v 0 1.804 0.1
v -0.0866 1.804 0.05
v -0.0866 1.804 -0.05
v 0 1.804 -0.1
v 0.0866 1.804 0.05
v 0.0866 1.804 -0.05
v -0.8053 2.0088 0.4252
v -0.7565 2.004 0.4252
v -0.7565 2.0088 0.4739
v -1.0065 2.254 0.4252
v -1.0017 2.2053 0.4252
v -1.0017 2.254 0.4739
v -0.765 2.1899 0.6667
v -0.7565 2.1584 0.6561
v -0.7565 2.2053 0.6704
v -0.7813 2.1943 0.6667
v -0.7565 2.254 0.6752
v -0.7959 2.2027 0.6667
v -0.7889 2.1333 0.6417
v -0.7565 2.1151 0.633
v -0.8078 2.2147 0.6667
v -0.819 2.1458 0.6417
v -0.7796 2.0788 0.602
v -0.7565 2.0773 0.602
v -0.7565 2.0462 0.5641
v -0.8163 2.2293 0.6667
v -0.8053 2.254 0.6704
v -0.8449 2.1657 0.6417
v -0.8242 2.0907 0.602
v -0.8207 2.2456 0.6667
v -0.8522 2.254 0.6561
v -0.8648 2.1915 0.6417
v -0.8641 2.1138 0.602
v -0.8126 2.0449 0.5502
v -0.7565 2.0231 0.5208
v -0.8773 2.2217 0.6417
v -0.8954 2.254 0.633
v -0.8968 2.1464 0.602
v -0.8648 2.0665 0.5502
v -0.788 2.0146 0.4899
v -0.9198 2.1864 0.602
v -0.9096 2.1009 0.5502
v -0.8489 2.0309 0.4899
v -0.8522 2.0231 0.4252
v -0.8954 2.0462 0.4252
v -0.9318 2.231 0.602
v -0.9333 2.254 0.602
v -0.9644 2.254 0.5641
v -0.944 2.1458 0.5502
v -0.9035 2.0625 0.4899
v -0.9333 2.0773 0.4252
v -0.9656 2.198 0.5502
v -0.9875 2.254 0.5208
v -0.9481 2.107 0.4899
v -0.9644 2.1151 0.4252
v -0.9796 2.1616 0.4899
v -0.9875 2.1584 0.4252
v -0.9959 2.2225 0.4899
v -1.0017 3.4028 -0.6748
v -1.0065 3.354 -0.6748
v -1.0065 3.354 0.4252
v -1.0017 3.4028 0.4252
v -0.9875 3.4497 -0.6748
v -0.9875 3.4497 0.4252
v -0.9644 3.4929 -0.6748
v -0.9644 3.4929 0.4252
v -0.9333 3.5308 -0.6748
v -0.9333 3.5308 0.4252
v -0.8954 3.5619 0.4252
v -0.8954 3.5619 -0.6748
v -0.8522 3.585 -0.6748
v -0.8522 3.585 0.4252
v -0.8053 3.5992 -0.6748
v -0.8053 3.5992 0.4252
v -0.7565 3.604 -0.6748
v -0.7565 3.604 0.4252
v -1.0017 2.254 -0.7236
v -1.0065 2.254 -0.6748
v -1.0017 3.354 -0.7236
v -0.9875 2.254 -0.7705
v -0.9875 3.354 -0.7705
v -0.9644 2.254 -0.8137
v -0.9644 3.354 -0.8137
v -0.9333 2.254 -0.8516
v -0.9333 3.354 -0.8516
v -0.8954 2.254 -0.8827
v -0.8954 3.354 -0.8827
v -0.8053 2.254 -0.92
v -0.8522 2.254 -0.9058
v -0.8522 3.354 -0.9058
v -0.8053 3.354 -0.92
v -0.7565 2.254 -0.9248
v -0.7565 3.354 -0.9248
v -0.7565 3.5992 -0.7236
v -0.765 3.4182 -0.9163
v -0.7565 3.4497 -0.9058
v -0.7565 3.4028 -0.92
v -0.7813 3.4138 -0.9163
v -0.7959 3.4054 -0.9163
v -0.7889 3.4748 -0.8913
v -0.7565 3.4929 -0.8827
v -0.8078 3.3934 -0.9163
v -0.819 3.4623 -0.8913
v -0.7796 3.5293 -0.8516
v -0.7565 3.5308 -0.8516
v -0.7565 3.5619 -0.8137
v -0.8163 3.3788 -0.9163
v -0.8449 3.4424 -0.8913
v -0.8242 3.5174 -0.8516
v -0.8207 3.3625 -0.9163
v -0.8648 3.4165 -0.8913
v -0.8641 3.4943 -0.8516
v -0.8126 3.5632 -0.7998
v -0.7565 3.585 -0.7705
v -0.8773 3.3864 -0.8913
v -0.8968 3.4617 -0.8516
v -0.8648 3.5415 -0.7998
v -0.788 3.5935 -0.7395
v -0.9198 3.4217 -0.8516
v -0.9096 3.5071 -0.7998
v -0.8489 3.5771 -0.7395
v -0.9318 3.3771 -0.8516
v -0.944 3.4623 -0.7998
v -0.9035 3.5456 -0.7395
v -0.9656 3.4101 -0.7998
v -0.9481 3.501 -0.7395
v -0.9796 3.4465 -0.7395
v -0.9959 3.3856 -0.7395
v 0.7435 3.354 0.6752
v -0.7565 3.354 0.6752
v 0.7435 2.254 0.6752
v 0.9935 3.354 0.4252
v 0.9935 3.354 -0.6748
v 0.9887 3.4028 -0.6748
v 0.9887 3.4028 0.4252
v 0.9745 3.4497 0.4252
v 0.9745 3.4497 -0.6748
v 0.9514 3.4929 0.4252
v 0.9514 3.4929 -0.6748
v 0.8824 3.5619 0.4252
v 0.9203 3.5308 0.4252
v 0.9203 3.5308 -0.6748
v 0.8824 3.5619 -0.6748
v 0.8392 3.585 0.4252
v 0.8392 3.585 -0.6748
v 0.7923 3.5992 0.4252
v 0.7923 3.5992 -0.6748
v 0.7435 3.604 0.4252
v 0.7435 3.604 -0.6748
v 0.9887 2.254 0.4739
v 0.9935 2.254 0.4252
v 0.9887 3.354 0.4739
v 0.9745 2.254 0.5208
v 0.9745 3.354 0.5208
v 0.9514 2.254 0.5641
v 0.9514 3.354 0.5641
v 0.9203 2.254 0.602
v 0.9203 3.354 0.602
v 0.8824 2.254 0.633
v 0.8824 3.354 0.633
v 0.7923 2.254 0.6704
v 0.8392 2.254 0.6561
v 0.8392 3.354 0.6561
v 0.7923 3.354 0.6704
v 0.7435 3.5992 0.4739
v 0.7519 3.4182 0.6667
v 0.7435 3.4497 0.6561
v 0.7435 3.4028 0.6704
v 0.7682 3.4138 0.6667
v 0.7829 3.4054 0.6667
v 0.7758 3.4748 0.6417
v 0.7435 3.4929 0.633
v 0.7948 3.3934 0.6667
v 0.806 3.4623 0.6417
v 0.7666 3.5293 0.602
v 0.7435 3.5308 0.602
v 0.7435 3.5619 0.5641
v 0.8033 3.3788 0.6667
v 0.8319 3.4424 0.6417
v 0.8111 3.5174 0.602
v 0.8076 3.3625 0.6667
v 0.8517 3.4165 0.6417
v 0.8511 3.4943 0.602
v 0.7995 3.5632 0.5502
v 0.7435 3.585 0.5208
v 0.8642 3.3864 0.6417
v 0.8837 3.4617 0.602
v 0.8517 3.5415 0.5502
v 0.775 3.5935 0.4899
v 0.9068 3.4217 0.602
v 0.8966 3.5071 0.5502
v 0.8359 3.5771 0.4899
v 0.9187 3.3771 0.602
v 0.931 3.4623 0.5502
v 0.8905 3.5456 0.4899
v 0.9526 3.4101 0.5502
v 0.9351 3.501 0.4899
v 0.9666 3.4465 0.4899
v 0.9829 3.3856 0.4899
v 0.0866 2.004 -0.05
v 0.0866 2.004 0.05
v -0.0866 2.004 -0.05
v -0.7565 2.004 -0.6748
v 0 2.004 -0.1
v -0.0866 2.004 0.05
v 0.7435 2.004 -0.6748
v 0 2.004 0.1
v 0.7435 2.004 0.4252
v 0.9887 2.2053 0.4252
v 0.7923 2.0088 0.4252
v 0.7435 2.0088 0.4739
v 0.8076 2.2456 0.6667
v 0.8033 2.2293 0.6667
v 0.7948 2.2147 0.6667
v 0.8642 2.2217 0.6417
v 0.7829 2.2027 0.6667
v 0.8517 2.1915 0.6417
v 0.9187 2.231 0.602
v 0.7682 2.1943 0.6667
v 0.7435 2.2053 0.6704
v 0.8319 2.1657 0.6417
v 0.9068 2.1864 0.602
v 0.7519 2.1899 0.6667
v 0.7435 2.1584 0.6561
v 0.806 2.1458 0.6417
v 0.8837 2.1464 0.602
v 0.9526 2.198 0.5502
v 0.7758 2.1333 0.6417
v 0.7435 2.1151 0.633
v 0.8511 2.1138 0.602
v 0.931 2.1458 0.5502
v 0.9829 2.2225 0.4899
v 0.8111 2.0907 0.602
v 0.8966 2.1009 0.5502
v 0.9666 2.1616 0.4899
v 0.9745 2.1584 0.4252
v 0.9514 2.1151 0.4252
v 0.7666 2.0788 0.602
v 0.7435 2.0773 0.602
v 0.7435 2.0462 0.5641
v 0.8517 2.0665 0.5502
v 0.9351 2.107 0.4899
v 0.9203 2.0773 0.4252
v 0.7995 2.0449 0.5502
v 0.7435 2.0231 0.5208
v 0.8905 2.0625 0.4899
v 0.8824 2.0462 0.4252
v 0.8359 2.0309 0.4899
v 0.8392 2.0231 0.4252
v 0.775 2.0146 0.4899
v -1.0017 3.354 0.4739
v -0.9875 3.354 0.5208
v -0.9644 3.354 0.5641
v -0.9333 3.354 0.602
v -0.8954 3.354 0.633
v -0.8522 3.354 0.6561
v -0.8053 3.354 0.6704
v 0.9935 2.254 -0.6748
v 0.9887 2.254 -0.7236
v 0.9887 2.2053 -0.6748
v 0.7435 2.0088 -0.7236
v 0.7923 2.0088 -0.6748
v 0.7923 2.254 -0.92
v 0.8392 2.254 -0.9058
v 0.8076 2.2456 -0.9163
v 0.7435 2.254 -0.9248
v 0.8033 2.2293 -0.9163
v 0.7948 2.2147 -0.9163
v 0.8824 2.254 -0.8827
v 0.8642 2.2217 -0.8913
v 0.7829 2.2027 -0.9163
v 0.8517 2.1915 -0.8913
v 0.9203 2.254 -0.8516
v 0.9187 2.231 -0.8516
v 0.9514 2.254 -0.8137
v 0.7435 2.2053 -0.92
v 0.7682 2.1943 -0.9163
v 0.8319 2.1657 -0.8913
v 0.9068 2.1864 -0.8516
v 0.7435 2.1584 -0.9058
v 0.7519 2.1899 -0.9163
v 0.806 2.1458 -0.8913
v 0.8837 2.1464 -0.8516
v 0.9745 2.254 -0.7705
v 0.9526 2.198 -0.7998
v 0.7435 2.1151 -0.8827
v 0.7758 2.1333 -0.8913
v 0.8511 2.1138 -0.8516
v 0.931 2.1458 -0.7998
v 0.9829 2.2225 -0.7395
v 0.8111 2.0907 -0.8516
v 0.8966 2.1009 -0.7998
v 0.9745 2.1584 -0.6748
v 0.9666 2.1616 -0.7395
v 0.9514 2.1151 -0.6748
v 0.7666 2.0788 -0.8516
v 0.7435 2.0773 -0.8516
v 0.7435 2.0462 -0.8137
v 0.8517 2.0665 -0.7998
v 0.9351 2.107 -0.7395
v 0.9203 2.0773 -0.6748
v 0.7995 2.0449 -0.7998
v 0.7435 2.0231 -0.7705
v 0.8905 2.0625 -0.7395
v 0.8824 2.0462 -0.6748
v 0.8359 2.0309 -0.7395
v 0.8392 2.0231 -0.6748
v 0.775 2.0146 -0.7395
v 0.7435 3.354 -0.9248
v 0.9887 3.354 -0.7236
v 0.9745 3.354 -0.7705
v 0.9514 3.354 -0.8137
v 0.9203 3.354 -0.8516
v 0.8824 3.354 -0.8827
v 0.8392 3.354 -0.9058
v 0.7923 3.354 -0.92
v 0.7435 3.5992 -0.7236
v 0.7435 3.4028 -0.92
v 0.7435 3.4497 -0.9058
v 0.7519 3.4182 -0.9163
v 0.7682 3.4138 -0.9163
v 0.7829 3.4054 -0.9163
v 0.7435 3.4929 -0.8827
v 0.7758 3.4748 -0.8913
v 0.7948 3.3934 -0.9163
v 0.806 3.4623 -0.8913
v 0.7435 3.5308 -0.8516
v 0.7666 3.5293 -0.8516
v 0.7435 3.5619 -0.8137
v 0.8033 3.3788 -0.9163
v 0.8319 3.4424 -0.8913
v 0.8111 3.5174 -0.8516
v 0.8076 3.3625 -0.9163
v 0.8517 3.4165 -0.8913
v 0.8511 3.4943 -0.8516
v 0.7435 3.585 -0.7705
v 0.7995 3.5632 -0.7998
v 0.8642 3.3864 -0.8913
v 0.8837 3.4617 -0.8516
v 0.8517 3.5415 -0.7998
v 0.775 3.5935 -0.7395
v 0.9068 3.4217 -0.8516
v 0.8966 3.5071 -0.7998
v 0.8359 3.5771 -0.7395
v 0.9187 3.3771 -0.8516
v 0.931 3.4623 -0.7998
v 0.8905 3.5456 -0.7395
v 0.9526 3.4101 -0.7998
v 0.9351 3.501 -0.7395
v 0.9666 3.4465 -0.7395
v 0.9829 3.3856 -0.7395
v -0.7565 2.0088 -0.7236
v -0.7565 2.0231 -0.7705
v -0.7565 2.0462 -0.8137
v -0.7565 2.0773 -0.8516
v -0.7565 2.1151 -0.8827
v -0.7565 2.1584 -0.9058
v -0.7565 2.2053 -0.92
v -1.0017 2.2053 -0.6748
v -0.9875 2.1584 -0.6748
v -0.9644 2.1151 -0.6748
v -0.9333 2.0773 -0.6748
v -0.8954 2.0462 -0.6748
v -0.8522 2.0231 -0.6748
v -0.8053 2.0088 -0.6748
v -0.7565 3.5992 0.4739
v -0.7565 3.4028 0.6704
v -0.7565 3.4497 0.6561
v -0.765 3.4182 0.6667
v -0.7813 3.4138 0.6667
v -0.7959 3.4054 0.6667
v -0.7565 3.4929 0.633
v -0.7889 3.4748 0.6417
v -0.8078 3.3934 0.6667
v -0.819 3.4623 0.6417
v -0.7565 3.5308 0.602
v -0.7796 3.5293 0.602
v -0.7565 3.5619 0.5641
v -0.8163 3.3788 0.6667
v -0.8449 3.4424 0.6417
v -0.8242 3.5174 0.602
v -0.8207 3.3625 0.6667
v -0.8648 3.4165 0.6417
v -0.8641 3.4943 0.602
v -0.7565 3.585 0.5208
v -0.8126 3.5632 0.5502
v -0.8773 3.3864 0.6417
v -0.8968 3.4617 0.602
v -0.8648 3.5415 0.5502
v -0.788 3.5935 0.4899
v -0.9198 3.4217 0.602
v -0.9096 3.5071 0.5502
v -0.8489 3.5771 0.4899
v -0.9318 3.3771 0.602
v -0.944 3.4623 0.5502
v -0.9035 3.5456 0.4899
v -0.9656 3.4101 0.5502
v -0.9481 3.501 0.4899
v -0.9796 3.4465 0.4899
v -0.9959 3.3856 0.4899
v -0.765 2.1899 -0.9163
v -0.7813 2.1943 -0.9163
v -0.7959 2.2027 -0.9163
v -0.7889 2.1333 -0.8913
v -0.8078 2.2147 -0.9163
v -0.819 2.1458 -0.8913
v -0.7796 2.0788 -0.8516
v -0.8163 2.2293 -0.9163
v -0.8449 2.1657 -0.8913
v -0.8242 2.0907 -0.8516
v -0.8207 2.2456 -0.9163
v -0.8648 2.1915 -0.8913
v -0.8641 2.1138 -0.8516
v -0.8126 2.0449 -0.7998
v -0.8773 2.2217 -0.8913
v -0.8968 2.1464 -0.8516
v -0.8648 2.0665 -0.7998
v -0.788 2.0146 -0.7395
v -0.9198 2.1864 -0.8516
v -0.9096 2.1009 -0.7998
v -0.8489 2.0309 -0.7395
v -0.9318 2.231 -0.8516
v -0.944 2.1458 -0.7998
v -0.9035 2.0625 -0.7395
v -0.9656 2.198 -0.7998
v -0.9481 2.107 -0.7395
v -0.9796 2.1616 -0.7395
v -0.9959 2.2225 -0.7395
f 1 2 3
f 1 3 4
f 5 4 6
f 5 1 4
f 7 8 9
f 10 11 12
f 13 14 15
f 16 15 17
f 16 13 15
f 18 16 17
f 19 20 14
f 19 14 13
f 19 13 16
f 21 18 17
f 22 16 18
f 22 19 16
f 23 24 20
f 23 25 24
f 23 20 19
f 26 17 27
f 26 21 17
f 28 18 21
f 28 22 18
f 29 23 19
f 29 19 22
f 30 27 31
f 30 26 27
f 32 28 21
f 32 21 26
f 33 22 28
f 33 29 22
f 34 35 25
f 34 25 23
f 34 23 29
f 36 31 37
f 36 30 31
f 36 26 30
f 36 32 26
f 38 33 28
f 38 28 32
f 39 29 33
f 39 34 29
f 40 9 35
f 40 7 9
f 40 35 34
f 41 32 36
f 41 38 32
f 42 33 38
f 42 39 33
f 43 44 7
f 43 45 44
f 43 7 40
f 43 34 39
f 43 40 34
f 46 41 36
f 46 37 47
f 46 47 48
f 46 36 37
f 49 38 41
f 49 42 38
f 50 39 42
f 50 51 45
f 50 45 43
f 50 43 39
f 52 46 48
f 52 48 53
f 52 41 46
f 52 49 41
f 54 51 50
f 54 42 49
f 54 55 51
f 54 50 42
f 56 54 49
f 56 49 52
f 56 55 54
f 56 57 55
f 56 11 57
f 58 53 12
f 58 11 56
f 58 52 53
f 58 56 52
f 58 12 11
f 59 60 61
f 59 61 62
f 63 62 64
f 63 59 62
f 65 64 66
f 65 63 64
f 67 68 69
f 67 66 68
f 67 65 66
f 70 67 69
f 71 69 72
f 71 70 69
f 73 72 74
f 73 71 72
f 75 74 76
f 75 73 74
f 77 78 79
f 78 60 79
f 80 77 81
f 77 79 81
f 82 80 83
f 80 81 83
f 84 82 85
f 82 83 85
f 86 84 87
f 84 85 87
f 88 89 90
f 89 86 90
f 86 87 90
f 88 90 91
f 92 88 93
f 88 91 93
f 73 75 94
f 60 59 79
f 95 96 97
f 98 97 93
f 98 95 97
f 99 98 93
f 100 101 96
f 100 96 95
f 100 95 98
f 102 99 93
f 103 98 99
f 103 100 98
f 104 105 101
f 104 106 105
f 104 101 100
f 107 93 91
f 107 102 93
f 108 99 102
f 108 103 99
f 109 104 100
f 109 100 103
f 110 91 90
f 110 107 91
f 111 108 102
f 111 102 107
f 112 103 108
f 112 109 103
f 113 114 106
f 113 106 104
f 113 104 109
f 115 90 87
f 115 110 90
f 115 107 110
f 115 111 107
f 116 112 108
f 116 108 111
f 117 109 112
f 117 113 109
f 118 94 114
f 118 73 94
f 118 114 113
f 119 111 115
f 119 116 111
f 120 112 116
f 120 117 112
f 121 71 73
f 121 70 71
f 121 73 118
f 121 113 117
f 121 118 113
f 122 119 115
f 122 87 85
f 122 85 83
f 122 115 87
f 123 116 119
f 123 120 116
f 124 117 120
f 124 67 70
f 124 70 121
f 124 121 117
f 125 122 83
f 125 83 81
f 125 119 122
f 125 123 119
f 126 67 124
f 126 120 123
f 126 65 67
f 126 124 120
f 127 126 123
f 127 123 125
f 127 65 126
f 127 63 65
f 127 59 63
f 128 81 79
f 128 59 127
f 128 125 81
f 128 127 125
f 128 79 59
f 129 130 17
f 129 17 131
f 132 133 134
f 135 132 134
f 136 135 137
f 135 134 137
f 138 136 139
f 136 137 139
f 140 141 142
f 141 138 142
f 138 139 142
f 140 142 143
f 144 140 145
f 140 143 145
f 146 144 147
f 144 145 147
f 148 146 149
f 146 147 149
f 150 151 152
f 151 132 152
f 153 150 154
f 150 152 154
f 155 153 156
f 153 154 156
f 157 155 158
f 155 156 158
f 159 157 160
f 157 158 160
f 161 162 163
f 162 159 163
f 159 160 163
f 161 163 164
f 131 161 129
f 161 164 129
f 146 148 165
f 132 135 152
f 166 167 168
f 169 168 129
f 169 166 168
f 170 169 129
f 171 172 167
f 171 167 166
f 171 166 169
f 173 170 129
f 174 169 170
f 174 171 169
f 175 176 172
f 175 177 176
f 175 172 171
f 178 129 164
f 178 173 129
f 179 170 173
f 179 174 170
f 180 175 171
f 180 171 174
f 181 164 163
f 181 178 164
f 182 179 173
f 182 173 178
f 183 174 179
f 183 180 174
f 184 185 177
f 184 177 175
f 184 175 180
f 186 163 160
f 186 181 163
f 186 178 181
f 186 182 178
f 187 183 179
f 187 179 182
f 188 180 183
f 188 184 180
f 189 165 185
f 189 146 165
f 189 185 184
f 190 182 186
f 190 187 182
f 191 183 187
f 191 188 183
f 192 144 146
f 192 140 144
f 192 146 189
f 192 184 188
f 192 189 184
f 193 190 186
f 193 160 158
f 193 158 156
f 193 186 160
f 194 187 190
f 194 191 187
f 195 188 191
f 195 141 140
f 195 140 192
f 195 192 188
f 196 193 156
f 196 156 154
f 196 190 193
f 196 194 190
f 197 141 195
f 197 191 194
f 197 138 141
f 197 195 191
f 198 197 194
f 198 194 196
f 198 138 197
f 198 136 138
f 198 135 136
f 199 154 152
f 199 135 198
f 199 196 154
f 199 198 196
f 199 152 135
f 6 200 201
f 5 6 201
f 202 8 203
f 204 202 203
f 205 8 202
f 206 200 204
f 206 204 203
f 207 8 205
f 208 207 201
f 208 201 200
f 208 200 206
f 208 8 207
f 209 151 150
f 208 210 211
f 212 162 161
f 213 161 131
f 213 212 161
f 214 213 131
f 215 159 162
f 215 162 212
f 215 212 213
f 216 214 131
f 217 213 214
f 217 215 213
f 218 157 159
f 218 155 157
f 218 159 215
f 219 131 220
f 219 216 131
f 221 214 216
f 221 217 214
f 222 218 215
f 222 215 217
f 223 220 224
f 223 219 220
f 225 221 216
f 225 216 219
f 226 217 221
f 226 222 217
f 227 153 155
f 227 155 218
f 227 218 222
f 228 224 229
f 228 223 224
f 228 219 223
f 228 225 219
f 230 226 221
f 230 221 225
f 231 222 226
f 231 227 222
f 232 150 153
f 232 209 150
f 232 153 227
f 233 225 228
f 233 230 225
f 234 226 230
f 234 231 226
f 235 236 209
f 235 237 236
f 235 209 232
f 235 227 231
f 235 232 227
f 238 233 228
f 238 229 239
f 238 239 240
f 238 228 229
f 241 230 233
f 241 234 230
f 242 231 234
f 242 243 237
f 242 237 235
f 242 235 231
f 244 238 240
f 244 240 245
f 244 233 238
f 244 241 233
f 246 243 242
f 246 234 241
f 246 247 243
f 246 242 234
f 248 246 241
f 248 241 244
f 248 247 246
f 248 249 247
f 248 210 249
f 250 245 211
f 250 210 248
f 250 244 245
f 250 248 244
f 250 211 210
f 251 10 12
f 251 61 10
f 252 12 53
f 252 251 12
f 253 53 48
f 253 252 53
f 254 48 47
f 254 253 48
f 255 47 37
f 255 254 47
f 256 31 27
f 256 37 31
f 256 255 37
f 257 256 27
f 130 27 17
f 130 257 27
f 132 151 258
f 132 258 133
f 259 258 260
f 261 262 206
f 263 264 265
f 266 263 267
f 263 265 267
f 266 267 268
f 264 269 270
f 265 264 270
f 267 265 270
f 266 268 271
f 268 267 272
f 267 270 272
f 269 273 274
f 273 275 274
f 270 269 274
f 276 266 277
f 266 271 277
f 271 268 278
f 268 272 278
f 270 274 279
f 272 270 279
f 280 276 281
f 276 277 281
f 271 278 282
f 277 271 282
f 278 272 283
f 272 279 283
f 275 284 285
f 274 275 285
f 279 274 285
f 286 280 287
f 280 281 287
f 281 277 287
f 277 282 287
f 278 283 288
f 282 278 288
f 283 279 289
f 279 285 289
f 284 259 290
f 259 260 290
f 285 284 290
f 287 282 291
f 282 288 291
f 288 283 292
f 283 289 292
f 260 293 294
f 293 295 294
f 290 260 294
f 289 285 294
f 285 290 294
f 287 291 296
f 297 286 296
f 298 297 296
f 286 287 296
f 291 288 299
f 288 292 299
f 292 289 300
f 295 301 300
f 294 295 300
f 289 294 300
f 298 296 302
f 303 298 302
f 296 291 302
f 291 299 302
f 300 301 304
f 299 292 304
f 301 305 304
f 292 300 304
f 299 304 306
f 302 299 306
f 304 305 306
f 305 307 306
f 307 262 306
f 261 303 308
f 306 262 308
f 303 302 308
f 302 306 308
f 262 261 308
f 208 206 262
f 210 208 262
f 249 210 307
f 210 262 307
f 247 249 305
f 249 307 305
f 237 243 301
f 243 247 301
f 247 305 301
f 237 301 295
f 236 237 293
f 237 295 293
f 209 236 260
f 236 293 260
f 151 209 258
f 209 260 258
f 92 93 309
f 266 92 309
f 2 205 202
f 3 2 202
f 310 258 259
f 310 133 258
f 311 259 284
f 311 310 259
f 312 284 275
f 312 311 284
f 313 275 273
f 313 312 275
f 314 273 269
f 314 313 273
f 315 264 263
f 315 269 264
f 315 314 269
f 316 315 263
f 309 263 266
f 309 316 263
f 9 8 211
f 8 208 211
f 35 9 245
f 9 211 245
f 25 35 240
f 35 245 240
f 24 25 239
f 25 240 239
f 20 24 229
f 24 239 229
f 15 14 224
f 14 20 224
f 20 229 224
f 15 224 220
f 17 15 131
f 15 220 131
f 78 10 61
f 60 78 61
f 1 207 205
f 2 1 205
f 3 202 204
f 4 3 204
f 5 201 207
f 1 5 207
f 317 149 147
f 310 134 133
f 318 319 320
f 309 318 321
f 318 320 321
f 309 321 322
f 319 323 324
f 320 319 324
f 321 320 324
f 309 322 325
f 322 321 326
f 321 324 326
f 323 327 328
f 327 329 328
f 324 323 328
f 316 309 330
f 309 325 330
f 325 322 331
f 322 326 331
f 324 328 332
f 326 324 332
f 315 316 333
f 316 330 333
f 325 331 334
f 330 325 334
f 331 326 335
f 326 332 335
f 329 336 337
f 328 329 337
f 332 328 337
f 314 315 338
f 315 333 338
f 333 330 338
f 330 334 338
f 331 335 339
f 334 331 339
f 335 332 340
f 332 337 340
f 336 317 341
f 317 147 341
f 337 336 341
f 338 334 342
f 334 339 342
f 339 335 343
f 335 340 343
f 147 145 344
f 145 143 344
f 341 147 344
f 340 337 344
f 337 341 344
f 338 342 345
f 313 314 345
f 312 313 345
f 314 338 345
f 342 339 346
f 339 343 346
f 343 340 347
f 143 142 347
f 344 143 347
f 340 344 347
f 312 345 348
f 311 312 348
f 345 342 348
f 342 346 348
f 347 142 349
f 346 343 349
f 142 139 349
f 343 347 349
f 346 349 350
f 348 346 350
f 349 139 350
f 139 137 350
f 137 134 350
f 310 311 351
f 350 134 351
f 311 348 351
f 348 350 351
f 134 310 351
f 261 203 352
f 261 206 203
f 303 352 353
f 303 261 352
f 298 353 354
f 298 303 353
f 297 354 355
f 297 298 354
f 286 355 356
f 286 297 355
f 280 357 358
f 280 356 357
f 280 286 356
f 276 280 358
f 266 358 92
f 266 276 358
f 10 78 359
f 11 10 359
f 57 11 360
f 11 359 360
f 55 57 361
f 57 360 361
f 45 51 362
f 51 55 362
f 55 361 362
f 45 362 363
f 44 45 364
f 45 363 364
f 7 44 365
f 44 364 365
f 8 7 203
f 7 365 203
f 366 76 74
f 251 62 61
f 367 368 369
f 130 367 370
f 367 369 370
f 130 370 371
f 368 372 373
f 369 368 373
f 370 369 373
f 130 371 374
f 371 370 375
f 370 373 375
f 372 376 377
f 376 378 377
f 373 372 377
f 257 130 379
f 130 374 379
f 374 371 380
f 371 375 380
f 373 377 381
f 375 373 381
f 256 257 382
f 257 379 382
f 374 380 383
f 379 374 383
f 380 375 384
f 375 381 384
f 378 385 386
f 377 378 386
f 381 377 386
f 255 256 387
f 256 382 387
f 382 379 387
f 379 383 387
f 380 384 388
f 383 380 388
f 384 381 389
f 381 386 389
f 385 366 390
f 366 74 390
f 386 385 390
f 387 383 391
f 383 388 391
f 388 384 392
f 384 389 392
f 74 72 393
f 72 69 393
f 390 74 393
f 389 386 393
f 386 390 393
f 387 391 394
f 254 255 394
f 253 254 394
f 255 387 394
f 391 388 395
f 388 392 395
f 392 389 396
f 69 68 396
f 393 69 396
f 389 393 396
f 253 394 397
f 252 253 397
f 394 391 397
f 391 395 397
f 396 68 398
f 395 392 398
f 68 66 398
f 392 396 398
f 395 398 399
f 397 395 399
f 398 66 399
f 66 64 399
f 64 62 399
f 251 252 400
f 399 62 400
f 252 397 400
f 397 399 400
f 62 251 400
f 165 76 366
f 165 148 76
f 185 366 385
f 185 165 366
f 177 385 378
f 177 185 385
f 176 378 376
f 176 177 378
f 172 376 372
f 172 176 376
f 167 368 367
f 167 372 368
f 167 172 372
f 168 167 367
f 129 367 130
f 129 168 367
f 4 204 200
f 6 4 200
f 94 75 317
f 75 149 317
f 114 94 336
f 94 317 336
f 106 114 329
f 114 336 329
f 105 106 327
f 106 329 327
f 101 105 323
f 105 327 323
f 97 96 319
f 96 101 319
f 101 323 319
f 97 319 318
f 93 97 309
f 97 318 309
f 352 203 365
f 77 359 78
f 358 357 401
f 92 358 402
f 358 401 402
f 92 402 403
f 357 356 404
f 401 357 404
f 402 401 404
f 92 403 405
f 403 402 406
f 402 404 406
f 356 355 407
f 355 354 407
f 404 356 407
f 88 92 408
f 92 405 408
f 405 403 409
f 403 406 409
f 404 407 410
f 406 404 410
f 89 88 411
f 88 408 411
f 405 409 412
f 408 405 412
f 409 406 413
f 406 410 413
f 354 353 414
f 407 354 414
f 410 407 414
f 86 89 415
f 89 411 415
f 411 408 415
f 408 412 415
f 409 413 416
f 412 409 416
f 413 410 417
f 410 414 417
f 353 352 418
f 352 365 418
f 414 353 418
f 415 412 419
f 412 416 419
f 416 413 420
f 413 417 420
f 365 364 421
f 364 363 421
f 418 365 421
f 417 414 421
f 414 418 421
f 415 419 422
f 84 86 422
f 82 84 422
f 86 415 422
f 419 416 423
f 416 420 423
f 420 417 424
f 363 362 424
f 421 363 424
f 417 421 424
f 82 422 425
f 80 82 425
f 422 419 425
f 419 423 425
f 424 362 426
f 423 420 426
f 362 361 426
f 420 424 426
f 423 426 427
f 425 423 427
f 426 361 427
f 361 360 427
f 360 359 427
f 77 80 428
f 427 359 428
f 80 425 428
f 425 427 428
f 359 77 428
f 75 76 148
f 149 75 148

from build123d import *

# Parameters (mm, degrees)
SKETCH002_W  = 2
SKETCH002_H  = 1.6
PAD001_DEPTH = 1.6
FILLET003_R  = 0.25
PAD_DEPTH    = 0.2


with BuildPart() as part:
    # Sketch002 → Pad001 (new body)
    with BuildSketch(Plane(origin=(-0.006516, 2.004042, 0.675175), x_dir=(1, 0, 0), z_dir=(0, 0, 1))):
        with Locations((0, 0.8)):
            Rectangle(SKETCH002_W, SKETCH002_H)
    extrude(amount=-PAD001_DEPTH)

    # Fillet003
    fillet003_edges = [part.edges().sort_by_distance(p)[0] for p in [
        (-1.006516, 3.604042, -0.124825),
        (0.993484, 3.604042, -0.124825),
        (-0.006516, 3.604042, 0.675175),
        (-0.006516, 3.604042, -0.924825),
        (0.993484, 2.004042, -0.124825),
        (0.993484, 2.804042, 0.675175),
        (0.993484, 2.804042, -0.924825),
        (-1.006516, 2.004042, -0.124825),
        (-0.006516, 2.004042, 0.675175),
        (-0.006516, 2.004042, -0.924825),
        (-1.006516, 2.804042, 0.675175),
        (-1.006516, 2.804042, -0.924825),
    ]]
    fillet(fillet003_edges, radius=FILLET003_R)

    # Sketch → Pad (new body)
    with BuildSketch(Plane.XZ.offset(-2.004042)):
        Polygon((0, 0.1), (-0.086603, 0.05), (-0.086603, -0.05), (0, -0.1), (0.086603, -0.05), (0.086603, 0.05), align=None)
    extrude(amount=PAD_DEPTH)


solid = part.part
